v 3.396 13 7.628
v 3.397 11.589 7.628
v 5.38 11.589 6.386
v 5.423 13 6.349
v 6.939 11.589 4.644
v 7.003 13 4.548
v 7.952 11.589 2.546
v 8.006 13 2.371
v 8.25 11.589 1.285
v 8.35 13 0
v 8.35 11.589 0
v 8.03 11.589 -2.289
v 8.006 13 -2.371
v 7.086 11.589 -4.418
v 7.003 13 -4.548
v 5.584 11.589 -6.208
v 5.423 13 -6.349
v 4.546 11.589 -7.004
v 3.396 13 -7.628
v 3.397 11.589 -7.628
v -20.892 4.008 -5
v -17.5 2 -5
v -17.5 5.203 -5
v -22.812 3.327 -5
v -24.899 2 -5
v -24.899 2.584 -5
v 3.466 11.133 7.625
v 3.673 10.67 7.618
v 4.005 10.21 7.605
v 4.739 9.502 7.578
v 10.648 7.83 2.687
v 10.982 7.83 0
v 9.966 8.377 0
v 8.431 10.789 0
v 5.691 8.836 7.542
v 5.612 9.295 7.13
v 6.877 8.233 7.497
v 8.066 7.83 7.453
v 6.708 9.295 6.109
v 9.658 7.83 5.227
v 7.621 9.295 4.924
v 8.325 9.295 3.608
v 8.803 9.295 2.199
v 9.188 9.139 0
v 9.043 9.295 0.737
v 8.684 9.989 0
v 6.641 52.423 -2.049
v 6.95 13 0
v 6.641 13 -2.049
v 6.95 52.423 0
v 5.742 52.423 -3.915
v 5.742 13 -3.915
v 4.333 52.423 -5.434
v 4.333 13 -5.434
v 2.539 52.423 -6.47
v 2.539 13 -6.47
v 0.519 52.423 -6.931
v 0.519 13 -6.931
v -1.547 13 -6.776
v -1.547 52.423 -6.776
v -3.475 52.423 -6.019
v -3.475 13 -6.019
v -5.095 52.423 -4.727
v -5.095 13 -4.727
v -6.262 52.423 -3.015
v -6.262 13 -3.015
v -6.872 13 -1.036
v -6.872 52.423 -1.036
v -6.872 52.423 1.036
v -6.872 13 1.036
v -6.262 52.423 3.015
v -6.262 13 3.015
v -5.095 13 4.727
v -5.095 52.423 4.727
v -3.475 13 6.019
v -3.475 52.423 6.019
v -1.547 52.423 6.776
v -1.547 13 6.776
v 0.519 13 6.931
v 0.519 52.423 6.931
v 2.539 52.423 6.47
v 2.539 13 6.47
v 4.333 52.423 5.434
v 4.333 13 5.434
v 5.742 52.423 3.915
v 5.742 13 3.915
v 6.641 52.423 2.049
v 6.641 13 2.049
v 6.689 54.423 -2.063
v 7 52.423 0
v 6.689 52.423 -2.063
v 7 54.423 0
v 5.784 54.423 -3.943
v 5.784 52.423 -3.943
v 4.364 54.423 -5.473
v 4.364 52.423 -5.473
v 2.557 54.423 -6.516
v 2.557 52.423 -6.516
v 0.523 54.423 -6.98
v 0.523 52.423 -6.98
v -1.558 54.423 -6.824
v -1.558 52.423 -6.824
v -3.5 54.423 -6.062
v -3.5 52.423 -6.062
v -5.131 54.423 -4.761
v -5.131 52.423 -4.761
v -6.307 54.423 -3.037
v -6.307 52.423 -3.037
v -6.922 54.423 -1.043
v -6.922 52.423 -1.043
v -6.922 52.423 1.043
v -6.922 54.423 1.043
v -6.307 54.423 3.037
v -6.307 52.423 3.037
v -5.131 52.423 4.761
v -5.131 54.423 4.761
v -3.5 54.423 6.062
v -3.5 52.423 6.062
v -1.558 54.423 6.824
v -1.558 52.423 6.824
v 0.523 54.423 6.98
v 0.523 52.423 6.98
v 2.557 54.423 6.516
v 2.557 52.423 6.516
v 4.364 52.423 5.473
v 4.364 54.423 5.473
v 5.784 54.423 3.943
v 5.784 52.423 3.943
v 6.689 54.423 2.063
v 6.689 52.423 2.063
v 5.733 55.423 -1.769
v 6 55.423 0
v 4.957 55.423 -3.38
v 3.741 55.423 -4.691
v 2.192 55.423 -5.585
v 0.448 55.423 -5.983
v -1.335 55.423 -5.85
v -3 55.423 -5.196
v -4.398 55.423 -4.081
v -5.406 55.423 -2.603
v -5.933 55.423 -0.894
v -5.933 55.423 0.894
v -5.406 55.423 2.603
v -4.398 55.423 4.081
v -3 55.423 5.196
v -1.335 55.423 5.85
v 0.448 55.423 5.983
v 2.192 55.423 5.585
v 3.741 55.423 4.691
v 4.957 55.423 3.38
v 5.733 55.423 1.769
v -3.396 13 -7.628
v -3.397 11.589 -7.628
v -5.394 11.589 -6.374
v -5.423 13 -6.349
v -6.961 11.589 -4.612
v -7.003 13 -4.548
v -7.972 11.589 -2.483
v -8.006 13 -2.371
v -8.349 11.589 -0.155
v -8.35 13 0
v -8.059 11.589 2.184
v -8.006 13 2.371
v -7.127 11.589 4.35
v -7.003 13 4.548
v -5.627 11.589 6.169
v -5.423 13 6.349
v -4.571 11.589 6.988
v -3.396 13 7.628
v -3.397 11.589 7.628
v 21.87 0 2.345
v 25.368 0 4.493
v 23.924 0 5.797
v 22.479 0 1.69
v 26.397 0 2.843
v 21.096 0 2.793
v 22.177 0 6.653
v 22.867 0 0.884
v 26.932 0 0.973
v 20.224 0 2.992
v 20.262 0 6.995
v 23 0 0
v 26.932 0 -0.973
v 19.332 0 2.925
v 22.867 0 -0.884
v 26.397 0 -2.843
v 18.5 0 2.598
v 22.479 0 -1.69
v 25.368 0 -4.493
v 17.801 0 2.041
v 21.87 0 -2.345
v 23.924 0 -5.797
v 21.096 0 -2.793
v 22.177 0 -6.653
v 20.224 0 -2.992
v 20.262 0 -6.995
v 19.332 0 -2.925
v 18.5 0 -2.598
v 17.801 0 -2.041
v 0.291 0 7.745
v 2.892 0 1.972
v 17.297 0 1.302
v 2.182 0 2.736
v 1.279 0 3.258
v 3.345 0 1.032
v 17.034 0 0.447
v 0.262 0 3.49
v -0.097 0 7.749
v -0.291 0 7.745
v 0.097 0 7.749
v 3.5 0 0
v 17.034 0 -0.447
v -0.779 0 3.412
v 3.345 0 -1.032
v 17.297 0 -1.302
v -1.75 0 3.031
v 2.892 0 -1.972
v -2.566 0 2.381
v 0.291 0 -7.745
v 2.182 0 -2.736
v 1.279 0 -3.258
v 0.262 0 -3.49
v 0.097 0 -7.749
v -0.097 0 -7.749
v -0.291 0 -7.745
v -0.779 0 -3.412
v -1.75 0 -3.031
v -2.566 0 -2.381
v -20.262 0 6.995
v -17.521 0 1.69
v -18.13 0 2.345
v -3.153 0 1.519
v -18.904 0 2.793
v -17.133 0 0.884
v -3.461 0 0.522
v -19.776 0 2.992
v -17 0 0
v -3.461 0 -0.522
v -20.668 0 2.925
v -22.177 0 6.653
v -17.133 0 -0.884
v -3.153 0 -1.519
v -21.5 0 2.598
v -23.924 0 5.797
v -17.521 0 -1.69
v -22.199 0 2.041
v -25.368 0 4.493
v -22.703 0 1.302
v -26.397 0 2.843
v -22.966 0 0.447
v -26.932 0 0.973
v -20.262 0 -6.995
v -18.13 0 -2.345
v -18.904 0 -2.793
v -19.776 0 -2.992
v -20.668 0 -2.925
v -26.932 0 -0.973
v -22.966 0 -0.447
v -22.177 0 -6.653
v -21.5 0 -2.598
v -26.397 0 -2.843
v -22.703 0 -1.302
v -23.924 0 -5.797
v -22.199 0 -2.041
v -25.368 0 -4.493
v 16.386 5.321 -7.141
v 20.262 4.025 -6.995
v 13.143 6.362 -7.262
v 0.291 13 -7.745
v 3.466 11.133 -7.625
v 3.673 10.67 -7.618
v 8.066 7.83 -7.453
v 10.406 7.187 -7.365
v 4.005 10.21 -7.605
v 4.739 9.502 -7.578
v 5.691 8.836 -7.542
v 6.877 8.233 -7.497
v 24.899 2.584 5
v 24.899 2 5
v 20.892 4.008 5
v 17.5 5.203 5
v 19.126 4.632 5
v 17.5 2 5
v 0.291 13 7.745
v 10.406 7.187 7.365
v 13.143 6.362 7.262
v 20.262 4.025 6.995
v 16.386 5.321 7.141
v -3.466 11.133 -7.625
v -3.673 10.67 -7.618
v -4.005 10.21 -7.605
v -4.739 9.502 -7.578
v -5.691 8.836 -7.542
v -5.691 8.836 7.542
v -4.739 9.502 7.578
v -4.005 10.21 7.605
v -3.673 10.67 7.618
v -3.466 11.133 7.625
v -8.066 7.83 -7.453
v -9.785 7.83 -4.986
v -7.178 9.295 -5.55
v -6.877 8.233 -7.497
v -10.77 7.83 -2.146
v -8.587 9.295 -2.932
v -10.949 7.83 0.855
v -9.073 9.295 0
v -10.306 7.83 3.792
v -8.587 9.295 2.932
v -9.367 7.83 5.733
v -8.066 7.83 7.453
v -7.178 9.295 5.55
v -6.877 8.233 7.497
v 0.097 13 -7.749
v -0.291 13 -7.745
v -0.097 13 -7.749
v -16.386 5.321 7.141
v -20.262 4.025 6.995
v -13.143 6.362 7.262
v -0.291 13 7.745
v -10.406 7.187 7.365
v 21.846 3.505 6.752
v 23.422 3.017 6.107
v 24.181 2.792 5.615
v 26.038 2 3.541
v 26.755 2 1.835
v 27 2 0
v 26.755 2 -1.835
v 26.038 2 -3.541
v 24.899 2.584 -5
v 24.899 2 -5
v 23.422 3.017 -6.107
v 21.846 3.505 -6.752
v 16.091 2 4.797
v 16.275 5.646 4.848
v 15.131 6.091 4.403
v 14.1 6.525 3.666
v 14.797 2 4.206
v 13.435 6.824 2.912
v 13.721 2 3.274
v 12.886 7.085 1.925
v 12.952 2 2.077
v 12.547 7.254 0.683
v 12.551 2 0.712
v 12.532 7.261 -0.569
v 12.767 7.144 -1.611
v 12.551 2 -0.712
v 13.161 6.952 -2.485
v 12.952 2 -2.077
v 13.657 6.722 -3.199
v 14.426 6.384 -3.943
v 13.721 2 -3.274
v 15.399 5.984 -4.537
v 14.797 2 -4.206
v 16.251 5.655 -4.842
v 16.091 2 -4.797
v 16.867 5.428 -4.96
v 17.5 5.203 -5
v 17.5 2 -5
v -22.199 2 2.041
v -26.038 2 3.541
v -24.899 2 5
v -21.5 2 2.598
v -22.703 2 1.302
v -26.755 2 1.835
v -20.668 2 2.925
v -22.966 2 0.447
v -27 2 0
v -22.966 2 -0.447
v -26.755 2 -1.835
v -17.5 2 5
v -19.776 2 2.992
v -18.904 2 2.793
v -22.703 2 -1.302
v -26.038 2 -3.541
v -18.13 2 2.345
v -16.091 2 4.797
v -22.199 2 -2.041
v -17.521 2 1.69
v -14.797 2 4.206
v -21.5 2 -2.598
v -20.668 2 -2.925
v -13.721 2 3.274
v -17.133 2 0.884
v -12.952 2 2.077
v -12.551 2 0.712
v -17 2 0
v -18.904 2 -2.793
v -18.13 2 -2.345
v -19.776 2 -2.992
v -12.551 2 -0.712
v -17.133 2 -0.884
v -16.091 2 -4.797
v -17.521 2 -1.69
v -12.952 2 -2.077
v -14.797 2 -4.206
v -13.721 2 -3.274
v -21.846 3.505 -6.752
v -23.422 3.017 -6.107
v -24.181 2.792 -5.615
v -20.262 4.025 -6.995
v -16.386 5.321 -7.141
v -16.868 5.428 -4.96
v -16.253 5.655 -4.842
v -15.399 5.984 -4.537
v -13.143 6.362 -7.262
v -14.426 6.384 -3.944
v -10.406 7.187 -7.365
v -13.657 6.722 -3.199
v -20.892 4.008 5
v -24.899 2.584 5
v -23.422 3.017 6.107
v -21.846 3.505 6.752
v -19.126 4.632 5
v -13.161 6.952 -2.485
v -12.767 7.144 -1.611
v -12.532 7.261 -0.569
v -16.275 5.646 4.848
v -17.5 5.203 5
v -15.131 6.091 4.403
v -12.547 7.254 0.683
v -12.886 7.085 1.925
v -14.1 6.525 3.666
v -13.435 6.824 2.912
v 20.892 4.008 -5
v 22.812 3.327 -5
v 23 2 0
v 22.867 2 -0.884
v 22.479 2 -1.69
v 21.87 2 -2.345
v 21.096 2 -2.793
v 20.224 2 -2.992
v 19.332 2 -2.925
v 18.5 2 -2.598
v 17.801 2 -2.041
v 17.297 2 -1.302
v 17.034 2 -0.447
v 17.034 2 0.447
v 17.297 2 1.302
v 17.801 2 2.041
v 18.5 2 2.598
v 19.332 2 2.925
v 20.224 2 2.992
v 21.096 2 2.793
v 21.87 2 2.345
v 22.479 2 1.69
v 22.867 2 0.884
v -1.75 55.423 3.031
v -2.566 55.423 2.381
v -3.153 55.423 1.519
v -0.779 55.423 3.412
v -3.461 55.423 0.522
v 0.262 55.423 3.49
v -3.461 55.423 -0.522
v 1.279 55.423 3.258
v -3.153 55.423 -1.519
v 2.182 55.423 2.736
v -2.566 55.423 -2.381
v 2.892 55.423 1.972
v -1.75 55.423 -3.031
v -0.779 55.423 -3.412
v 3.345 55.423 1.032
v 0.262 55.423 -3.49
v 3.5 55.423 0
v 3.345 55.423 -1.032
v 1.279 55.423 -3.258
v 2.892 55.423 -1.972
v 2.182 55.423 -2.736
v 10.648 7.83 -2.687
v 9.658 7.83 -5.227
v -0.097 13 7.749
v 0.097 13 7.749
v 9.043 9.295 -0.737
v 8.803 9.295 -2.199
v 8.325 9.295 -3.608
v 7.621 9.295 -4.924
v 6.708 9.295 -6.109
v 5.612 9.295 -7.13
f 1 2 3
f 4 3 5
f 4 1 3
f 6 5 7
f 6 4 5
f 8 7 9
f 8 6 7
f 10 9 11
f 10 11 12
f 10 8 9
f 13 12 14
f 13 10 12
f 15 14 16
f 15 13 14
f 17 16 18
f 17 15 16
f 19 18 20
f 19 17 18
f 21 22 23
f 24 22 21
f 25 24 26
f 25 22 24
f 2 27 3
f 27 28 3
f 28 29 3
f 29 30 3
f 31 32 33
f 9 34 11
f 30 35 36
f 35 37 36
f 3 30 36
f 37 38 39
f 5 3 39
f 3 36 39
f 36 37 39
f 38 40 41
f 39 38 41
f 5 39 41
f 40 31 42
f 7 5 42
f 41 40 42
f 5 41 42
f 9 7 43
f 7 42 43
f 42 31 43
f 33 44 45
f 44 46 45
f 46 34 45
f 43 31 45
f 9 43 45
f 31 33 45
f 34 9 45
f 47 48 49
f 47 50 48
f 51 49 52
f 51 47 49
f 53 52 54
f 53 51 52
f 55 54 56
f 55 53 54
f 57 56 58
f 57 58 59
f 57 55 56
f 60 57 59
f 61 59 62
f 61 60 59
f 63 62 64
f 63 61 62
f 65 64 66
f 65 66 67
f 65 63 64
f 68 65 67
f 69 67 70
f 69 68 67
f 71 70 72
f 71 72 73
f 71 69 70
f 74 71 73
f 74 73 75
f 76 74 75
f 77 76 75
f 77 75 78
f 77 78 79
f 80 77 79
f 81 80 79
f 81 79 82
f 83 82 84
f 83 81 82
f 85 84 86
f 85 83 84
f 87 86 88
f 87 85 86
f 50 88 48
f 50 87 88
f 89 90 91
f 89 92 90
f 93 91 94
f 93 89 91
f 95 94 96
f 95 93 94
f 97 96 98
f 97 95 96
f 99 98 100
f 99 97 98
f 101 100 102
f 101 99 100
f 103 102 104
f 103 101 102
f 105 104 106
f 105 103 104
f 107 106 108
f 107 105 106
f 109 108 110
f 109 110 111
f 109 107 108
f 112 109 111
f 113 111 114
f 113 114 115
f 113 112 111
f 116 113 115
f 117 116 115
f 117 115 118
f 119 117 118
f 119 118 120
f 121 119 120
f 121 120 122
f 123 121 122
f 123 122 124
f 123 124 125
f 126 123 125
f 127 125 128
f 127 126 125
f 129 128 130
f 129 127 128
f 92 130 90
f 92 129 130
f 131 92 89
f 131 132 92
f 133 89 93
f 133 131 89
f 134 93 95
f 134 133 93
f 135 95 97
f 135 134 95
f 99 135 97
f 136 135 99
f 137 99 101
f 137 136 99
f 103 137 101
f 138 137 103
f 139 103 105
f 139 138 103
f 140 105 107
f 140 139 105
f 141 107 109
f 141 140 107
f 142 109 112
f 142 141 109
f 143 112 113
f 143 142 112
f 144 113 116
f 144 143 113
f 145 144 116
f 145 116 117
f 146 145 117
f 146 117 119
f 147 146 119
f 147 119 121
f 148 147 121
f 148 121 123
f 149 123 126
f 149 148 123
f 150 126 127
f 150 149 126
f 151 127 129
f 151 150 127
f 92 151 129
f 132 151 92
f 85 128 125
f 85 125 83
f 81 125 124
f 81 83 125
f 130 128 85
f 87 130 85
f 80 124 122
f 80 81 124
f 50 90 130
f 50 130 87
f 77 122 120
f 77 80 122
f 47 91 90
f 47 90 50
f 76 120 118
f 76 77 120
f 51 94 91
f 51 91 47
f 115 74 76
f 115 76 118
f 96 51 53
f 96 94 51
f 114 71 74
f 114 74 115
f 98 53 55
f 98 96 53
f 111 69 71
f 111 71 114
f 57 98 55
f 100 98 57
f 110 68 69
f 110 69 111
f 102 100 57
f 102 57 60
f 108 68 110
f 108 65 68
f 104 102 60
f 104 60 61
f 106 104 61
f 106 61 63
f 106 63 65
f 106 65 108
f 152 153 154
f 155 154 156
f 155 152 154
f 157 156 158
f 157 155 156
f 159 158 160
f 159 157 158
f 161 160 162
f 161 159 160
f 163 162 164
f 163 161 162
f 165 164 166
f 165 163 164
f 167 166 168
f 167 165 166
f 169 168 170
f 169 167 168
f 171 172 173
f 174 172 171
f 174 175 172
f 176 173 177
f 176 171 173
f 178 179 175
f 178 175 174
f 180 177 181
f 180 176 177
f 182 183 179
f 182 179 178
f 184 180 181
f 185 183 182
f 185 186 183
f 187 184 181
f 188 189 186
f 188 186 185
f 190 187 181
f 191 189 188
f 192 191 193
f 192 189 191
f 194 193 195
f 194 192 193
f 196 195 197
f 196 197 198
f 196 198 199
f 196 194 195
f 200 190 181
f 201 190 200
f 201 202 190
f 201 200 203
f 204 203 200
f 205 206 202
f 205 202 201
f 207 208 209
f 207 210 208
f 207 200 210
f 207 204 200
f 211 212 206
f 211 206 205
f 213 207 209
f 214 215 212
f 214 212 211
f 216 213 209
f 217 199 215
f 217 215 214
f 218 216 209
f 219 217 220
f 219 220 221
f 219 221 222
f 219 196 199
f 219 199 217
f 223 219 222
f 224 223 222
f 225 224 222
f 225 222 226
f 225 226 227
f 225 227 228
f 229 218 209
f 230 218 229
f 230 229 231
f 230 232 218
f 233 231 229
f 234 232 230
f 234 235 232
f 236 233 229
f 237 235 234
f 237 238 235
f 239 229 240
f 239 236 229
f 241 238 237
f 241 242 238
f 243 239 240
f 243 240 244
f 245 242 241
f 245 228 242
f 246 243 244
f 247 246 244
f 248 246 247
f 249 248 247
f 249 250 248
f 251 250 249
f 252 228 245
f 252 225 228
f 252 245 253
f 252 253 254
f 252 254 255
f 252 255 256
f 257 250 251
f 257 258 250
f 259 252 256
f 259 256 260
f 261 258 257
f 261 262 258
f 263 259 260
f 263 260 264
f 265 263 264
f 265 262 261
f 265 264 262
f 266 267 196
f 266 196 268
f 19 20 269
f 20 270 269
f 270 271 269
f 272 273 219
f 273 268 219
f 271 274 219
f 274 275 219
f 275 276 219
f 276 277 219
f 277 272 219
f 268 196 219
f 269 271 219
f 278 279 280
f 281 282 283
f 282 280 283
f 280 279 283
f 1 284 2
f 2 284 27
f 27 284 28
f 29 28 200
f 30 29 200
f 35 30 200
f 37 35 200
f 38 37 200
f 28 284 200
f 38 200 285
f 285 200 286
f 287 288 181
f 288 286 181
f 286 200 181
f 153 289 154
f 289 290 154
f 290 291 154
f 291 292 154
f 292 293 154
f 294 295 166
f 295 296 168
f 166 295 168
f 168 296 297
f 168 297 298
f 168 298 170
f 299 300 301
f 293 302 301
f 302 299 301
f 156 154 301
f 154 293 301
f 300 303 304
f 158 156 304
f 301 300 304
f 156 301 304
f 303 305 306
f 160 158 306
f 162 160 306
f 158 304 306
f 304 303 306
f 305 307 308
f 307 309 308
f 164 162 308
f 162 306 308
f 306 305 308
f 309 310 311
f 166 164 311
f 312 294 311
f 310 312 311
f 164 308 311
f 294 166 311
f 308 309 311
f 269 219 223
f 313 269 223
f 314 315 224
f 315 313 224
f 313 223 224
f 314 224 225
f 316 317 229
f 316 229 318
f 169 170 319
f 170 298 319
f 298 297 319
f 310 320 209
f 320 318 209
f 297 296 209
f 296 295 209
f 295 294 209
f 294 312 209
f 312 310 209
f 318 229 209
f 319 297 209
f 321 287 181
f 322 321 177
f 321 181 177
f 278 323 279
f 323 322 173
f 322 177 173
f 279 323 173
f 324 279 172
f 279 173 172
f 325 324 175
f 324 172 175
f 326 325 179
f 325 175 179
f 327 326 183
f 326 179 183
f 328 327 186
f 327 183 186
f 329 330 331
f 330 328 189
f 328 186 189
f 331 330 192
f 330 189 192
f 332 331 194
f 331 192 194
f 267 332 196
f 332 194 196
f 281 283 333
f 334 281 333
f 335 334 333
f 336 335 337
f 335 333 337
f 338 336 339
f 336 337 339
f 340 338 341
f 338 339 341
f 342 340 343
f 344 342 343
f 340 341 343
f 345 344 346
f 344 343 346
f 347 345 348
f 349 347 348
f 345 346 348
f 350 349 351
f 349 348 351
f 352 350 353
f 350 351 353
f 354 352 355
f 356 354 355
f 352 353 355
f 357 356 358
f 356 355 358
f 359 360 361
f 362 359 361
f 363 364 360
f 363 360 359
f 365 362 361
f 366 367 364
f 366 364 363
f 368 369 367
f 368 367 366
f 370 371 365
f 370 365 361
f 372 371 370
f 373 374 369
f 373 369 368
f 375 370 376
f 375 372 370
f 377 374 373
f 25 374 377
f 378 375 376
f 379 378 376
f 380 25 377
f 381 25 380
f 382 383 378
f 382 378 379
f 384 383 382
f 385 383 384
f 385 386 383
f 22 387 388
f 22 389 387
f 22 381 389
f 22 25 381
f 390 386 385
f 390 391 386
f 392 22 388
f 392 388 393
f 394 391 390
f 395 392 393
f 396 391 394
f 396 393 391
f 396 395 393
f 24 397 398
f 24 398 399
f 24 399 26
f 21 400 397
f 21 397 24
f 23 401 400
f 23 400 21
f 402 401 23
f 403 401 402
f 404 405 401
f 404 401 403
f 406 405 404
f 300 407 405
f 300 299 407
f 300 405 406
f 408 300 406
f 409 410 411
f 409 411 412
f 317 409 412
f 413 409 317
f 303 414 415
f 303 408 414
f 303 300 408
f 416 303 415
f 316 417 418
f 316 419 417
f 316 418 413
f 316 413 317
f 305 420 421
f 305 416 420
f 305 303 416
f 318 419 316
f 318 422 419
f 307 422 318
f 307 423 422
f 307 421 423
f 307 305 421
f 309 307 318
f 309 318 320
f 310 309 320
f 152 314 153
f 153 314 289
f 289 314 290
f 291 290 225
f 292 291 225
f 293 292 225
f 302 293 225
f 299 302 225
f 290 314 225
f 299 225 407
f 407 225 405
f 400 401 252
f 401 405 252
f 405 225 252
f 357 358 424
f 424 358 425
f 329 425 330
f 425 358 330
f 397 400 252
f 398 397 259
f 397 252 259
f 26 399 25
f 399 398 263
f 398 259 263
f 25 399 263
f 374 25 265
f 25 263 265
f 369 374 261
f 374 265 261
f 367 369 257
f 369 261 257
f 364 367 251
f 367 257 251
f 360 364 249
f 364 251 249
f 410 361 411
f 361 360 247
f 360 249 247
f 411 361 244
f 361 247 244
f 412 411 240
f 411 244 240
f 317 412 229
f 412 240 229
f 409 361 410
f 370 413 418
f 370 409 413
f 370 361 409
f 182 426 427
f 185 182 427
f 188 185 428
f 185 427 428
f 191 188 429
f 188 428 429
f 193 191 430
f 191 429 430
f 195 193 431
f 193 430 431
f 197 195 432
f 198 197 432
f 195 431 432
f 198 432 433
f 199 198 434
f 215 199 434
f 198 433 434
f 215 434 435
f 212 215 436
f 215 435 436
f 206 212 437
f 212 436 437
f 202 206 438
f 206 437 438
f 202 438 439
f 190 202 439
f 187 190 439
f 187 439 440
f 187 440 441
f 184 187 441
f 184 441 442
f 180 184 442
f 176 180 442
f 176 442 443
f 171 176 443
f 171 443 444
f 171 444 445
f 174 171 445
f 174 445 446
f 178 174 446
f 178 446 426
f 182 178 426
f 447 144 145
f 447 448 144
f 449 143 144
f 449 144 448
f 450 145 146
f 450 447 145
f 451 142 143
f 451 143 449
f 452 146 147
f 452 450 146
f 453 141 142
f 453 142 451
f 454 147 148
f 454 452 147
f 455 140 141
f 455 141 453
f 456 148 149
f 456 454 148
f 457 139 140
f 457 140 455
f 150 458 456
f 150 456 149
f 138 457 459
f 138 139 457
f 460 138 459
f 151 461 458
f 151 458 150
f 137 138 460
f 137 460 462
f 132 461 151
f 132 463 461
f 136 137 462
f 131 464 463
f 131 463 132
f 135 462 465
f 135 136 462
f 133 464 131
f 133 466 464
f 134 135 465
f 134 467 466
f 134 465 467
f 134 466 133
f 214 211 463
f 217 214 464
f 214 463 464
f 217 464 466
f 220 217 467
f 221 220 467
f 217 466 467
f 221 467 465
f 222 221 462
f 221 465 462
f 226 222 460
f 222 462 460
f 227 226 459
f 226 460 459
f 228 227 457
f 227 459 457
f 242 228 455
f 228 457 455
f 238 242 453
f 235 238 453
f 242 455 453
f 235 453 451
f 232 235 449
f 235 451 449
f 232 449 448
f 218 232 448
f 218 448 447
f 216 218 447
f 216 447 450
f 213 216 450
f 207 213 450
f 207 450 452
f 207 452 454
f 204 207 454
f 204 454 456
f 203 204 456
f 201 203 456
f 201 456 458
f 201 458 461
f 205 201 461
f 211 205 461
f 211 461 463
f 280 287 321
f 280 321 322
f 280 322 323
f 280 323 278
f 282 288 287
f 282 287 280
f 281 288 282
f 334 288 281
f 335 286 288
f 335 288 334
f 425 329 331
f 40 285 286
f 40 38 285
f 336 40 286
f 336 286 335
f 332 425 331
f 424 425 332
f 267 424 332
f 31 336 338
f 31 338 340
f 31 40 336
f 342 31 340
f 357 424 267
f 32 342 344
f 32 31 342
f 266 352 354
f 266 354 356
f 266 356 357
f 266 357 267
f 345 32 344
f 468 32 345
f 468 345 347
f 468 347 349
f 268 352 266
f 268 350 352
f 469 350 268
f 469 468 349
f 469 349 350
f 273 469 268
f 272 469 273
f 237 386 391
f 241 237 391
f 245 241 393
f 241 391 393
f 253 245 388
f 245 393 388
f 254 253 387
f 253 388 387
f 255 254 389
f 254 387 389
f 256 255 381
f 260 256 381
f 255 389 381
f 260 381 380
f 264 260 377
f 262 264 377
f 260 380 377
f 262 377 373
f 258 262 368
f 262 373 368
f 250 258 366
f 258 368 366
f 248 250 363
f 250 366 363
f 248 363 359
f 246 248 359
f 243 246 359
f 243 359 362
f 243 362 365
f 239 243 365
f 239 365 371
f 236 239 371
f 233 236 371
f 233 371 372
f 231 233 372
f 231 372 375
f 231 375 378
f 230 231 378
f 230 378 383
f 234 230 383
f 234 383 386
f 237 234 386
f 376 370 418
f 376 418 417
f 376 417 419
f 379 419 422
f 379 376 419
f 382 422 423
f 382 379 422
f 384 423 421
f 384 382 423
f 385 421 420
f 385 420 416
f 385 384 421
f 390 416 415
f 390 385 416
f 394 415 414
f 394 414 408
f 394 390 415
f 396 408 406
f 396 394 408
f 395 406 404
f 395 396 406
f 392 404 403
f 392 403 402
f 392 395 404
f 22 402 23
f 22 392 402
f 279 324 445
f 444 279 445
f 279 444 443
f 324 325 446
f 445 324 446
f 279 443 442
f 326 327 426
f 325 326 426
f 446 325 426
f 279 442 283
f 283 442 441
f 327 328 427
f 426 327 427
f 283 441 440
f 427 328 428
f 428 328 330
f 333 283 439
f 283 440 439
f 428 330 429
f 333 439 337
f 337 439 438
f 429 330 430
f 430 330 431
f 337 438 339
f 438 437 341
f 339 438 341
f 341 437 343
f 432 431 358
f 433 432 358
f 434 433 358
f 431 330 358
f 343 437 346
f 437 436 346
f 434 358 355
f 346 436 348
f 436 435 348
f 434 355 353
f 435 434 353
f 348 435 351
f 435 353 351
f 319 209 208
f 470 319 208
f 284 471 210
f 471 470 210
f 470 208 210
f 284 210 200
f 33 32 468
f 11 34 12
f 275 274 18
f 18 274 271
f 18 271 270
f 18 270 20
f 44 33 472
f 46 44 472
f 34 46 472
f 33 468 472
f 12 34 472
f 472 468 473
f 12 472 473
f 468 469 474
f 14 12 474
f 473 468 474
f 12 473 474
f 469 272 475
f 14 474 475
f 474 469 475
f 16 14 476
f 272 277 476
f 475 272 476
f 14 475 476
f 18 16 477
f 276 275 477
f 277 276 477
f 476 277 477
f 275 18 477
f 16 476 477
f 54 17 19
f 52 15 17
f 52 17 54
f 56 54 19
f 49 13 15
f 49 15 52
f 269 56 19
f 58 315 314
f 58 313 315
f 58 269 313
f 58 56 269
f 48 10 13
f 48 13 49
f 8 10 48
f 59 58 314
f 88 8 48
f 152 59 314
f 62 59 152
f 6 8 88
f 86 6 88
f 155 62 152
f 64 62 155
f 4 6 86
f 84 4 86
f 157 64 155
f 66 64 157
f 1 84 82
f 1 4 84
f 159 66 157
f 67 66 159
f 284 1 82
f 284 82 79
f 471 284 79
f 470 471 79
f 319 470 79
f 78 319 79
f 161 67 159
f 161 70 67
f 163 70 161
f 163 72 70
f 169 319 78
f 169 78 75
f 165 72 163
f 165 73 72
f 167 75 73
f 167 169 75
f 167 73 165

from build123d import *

# Parameters (mm, degrees)
SZKIC1_W                        = 27
SZKIC1_H                        = 25
ZAOKR_GLENIE1_R                 = 4
SZKIC4_R                        = 3
WYTNIJ_WYCI_GNI_CIE3_DEPTH      = 24.0000001
WYTNIJ_WYCI_GNI_CIE3_DEPTH_BACK = 3
WYTNIJ_WYCI_GNI_CIE2_DEPTH      = 24.0000001
SZKIC5_OUTSIDE_W                = 72.072
SZKIC5_OUTSIDE_H                = 72.072
WYTNIJ_WYCI_GNI_CIE4_DEPTH      = 26.0000001
SZKIC8_W                        = 8.35
SZKIC8_H                        = 12
SZKIC10_R                       = 3.5
WYTNIJ_WYCI_GNI_CIE5_DEPTH      = 56.423393859


with BuildPart() as part:
    # Szkic1 → Obrót1 (revolve)
    with BuildSketch(Plane.XY):
        with Locations((13.5, 12.5)):
            Rectangle(SZKIC1_W, SZKIC1_H)
    revolve(axis=Axis((0, 0, 0), (0, 1, 0)))

    # Szkic2 → Wycięcie-obrót1 (revolve, cut)
    with BuildSketch(Plane.XY):
        Polygon((27, 25), (27, 2), (8.35, 8.788044869), (8.35, 25), align=None)
    revolve(axis=Axis((0, 0, 0), (0, 1, 0)), mode=Mode.SUBTRACT)

    # Zaokrąglenie1
    zaokr_glenie1_edges = [part.edges().sort_by_distance(p)[0] for p in [
        (-8.35, 8.788044869, 0),
    ]]
    fillet(zaokr_glenie1_edges, radius=ZAOKR_GLENIE1_R)

    # Szkic4 → Wytnij-wyciągnięcie3 (cut, two sides)
    with BuildSketch(Plane(origin=(0, 2, 0), x_dir=(1, 0, 0), z_dir=(0, 1, 0))) as wytnij_wyci_gni_cie3_sk:
        with Locations((-20, 0)):
            Circle(SZKIC4_R)
        with Locations((20, 0)):
            Circle(SZKIC4_R)
    extrude(amount=WYTNIJ_WYCI_GNI_CIE3_DEPTH, mode=Mode.SUBTRACT)
    extrude(wytnij_wyci_gni_cie3_sk.sketch, amount=-WYTNIJ_WYCI_GNI_CIE3_DEPTH_BACK, mode=Mode.SUBTRACT)

    # Szkic3 → Wytnij-wyciągnięcie2 (cut, through all)
    with BuildSketch(Plane(origin=(0, 2, 0), x_dir=(1, 0, 0), z_dir=(0, 1, 0))):
        with BuildLine():
            Line((-17.5, 5), (-26.532998323, 5))
            ThreePointArc((-26.532998323, 5), (-27, 0), (-26.532998323, -5))
            Line((-26.532998323, -5), (-17.5, -5))
            ThreePointArc((-17.5, -5), (-12.5, 0), (-17.5, 5))
        make_face()
        with BuildLine():
            Line((17.5, 5), (26.532998323, 5))
            ThreePointArc((26.532998323, 5), (27, 0), (26.532998323, -5))
            Line((26.532998323, -5), (17.5, -5))
            ThreePointArc((17.5, -5), (12.5, 0), (17.5, 5))
        make_face()
    extrude(amount=WYTNIJ_WYCI_GNI_CIE2_DEPTH, mode=Mode.SUBTRACT)

    # Szkic5 outside → Wytnij-wyciągnięcie4 (cut, through all)
    with BuildSketch(Plane.XZ):
        Rectangle(SZKIC5_OUTSIDE_W, SZKIC5_OUTSIDE_H)
        with BuildLine():
            Line((-20.2625, 6.995076393), (-0.290625, 7.744548864))
            ThreePointArc((-0.290625, 7.744548864), (0, 7.75), (0.290625, 7.744548864))
            Line((0.290625, 7.744548864), (20.2625, 6.995076393))
            ThreePointArc((20.2625, 6.995076393), (27, 0), (20.2625, -6.995076393))
            Line((20.2625, -6.995076393), (0.290625, -7.744548864))
            ThreePointArc((0.290625, -7.744548864), (0, -7.75), (-0.290625, -7.744548864))
            Line((-0.290625, -7.744548864), (-20.2625, -6.995076393))
            ThreePointArc((-20.2625, -6.995076393), (-27, 0), (-20.2625, 6.995076393))
        make_face(mode=Mode.SUBTRACT)
    extrude(amount=-WYTNIJ_WYCI_GNI_CIE4_DEPTH, mode=Mode.SUBTRACT)

    # Szkic8 → Wycięcie-obrót2 (revolve, cut)
    with BuildSketch(Plane.XY):
        with Locations((4.175, 19)):
            Rectangle(SZKIC8_W, SZKIC8_H)
    revolve(axis=Axis((0, 25, 0), (0, -1, 0)), mode=Mode.SUBTRACT)

    # Szkic9 → Obrót2 (revolve)
    with BuildSketch(Plane.XY):
        Polygon((6, 55.423393759), (0, 55.423393759), (0, 13), (6.95, 13), (6.95, 52.423393759), (7, 52.423393759), (7, 54.423393759), align=None)
    revolve(axis=Axis((0, 13, 0), (0, 1, 0)))

    # Szkic10 → Wytnij-wyciągnięcie5 (cut, through all)
    with BuildSketch(Plane(origin=(0, 55.423393759, 0), x_dir=(1, 0, 0), z_dir=(0, 1, 0))):
        Circle(SZKIC10_R)
    extrude(amount=-WYTNIJ_WYCI_GNI_CIE5_DEPTH, mode=Mode.SUBTRACT)


solid = part.part
